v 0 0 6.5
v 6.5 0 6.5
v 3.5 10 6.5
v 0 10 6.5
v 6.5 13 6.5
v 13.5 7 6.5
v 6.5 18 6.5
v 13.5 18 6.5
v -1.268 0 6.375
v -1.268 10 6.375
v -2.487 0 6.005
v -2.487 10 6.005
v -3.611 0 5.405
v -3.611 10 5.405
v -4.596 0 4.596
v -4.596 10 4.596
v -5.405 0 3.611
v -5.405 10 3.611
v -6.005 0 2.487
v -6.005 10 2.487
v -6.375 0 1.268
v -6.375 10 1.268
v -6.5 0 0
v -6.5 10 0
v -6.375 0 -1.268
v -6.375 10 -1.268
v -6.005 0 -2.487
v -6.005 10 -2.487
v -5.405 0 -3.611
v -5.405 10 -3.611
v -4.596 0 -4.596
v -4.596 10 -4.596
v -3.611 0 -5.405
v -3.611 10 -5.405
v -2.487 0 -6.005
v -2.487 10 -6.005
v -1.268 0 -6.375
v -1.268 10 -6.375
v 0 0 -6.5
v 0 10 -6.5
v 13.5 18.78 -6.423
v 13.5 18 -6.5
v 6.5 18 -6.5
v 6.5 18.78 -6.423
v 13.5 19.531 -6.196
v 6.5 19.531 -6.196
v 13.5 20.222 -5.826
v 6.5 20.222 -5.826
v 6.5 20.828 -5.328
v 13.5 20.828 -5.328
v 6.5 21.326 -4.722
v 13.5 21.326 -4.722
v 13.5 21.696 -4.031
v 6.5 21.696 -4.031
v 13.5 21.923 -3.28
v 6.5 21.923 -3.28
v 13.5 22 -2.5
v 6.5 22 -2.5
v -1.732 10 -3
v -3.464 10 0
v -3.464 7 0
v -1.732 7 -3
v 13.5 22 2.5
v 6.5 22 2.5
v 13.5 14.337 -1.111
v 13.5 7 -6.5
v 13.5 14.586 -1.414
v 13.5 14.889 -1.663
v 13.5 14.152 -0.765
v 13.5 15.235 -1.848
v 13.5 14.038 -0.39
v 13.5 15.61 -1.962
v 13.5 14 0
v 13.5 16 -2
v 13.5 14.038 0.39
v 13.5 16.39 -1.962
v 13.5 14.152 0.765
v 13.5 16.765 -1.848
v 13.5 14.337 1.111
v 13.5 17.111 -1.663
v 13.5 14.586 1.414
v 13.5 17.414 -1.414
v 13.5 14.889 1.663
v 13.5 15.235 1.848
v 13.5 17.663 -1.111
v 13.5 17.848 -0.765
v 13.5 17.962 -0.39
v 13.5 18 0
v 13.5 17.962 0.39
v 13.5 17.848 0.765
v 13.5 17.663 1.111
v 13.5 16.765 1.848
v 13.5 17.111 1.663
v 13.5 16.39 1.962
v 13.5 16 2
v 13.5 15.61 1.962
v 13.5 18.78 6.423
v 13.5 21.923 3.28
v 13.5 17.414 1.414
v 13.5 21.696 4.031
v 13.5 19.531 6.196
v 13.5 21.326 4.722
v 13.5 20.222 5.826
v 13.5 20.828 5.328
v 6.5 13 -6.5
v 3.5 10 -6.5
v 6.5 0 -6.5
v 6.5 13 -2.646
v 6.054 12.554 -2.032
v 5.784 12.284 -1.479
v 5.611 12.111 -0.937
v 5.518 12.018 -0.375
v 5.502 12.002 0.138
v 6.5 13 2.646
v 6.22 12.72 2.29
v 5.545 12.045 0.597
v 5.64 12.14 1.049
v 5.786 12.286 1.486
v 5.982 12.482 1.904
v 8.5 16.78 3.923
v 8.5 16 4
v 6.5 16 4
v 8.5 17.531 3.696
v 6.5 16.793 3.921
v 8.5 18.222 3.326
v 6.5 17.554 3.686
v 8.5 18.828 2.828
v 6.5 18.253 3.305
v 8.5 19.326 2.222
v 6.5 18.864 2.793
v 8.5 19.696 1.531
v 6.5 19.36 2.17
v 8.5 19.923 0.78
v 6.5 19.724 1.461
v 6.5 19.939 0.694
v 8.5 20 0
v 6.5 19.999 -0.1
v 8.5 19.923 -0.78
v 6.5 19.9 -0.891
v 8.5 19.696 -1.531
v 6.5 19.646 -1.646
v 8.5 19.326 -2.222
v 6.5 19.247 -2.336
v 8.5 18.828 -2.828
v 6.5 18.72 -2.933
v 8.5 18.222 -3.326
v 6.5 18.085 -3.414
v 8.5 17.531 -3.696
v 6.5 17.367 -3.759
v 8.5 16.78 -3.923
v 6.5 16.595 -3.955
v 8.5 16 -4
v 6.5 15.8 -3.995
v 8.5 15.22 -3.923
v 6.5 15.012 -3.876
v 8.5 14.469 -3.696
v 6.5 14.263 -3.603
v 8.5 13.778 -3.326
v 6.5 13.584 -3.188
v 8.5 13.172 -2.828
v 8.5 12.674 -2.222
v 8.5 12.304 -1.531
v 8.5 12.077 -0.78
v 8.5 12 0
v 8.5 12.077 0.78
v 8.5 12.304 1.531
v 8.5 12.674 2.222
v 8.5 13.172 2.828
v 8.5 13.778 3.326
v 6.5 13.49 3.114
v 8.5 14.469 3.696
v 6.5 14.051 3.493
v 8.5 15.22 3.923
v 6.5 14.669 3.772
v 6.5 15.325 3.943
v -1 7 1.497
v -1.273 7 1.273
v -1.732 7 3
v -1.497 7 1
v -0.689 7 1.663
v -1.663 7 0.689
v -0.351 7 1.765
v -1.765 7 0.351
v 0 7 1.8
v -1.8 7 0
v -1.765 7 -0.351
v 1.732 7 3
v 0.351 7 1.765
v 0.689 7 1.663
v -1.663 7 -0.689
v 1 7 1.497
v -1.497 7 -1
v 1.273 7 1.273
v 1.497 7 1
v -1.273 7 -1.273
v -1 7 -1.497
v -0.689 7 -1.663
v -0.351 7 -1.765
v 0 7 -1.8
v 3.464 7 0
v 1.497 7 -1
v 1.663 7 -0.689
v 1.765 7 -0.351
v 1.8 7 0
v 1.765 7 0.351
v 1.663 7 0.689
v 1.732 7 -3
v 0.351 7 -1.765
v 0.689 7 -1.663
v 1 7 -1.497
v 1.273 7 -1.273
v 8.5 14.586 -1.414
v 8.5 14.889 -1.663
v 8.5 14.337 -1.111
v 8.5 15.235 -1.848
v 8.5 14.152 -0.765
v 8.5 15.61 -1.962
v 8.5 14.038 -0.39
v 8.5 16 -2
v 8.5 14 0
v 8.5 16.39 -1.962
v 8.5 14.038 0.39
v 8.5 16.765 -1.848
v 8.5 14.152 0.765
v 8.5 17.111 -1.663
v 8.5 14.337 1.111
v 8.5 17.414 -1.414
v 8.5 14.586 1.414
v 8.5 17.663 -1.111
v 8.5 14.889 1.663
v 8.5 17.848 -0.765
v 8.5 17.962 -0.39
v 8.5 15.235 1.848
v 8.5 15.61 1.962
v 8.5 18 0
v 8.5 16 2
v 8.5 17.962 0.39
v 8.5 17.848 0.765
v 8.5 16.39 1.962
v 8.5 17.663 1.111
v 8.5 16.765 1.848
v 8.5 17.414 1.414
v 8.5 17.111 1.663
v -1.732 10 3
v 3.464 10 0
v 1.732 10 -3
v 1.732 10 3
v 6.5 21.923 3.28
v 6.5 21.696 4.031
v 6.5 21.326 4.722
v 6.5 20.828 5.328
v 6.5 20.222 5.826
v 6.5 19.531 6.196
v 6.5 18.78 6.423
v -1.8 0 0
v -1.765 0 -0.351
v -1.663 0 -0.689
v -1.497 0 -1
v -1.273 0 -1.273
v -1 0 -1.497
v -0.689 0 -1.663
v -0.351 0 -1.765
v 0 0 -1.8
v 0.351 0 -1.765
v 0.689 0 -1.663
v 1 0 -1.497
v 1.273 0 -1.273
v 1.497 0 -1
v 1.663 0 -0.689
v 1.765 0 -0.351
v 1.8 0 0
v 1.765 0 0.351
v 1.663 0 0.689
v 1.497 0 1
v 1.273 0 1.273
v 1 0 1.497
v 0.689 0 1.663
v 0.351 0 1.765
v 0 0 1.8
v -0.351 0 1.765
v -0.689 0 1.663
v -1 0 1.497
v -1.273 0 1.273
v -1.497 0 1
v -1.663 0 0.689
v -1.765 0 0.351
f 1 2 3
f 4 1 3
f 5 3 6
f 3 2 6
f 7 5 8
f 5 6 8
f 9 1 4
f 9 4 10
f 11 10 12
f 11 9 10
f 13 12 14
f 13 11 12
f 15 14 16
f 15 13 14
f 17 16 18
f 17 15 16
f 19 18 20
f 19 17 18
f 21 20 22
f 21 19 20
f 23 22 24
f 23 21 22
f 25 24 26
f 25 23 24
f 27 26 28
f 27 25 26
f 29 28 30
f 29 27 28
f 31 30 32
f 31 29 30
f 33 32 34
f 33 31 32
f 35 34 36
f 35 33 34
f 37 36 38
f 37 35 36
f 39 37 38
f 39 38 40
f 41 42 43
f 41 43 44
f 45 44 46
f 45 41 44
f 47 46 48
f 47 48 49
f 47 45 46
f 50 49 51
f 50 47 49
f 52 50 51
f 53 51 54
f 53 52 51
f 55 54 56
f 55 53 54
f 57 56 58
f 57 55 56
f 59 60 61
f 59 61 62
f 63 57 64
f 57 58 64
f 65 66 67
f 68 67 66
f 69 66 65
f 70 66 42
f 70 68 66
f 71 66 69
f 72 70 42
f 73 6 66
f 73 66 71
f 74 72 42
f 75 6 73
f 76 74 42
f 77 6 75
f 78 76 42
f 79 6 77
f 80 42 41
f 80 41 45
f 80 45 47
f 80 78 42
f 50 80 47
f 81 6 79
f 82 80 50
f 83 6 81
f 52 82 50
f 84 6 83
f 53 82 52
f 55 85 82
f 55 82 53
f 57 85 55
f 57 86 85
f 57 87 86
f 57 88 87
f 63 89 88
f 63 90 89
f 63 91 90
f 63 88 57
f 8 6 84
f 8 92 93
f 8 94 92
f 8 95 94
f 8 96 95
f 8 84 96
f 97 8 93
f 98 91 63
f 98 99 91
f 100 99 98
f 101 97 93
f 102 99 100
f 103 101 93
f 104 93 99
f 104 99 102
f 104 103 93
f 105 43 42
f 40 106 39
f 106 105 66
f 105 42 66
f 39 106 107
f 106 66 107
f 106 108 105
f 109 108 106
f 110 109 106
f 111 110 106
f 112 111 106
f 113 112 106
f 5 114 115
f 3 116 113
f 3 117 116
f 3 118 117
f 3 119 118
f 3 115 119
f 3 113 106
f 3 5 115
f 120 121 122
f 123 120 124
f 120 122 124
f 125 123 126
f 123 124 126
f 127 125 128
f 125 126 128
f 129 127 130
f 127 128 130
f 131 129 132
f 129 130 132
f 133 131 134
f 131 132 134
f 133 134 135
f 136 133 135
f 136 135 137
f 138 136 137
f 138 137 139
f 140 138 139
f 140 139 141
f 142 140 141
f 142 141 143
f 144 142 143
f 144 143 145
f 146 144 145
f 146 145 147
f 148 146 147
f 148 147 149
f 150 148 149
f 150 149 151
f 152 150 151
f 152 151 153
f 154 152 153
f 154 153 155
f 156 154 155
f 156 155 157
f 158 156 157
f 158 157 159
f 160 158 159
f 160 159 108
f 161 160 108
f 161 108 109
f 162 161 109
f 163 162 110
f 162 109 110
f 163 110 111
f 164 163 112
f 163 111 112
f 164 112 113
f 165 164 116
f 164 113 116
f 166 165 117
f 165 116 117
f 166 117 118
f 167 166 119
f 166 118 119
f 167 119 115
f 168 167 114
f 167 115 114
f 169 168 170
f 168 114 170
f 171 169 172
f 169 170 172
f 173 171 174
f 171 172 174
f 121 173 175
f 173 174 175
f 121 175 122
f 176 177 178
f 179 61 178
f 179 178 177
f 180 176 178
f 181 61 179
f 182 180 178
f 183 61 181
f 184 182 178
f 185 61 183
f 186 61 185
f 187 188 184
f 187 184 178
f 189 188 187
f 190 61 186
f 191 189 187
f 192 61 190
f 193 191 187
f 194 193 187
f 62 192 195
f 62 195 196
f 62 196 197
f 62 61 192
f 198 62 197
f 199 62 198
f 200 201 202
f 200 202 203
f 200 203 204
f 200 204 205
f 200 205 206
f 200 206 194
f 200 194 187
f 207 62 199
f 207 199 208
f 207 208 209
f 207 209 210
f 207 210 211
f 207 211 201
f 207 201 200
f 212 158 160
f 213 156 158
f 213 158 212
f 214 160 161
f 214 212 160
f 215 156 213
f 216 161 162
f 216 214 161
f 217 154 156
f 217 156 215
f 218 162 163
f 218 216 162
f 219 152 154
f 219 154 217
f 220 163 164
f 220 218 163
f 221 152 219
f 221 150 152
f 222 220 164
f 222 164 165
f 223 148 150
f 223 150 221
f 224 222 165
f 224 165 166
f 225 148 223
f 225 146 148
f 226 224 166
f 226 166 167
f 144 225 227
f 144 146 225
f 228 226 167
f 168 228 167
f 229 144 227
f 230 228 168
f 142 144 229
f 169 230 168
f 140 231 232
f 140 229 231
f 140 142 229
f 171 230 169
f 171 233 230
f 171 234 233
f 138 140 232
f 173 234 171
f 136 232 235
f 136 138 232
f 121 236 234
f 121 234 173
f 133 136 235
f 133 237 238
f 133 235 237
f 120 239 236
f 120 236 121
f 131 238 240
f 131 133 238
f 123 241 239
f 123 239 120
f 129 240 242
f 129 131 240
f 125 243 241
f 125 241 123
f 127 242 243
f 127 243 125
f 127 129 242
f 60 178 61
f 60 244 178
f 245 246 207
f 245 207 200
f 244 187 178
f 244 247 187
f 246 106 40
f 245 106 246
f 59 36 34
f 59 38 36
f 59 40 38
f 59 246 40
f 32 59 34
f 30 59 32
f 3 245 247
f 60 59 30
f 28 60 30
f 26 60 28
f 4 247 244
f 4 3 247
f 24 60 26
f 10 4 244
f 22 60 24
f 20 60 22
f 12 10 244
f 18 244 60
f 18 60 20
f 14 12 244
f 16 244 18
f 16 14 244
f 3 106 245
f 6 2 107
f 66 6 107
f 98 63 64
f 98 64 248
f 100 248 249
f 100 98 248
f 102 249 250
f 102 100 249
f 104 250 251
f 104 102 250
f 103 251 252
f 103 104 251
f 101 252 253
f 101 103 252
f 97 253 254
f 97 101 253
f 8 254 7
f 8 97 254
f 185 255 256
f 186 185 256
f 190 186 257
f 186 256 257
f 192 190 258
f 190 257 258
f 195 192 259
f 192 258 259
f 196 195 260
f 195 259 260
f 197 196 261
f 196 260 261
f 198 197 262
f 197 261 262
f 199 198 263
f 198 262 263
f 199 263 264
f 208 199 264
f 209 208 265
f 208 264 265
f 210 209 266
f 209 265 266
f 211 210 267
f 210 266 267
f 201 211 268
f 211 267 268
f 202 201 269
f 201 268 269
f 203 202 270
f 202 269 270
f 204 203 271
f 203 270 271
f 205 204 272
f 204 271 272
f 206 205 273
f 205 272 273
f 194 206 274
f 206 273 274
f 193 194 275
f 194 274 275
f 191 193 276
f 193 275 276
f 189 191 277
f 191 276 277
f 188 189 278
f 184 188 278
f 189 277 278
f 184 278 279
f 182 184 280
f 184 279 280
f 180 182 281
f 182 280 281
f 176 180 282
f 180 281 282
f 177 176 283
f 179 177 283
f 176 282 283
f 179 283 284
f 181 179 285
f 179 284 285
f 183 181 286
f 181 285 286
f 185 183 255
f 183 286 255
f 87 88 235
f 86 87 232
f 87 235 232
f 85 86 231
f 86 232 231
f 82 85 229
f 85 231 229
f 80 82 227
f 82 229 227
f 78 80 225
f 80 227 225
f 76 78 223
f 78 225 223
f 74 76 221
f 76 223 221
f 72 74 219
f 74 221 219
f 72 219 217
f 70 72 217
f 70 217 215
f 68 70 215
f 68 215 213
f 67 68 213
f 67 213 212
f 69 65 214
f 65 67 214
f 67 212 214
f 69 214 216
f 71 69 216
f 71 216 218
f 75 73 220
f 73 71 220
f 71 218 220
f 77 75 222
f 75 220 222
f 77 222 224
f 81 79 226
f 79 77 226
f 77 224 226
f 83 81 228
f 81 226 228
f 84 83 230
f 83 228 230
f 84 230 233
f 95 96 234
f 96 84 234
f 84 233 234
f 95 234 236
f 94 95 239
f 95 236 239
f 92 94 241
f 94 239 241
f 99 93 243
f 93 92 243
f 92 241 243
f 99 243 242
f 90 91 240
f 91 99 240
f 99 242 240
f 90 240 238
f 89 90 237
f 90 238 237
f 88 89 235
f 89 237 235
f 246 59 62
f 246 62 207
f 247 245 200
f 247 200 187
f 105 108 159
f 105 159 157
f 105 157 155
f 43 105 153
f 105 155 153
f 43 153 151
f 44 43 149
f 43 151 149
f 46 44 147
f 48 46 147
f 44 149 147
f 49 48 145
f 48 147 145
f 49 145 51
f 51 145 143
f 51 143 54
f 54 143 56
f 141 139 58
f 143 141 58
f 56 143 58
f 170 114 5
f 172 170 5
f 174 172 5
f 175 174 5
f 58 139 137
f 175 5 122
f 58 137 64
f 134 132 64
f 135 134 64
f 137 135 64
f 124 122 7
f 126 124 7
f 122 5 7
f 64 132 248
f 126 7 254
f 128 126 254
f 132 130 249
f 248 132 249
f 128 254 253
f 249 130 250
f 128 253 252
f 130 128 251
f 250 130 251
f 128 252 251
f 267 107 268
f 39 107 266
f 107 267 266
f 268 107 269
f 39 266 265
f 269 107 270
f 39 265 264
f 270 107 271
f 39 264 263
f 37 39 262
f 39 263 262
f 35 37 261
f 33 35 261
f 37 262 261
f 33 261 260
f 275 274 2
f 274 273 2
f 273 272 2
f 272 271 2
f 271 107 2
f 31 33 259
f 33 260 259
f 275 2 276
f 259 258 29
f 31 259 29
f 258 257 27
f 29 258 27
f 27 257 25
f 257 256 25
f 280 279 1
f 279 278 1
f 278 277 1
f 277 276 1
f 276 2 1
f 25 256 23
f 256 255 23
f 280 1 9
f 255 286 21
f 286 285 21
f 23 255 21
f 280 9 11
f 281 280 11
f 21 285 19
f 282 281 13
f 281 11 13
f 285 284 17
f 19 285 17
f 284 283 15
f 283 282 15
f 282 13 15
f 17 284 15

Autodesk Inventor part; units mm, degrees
ref_plane "XZ Plane" through (0, 0, 0) normal (0, 1, 0) x (-1, 0, 0)
ref_plane "XY Plane" through (0, 0, 0) normal (0, 0, 1) x (1, 0, 0)
sketch "Sketch1" plane through (0, 0, 0) normal (0, 1, 0) x (-1, 0, 0)
  circle A0 centre (0, 0) radius 6.5
  circle A1 centre (0, 0) radius 1.8
  dimension "d0" = 13
  dimension "d1" = 3.6
extrude "Extrusion1" add sketch "Sketch1" along normal blind 10
sketch "Sketch2" plane through (0, 10, 0) normal (0, 1, 0) x (1, 0, 0)
  point P0 (0, 0)
ref_plane "Work Plane1" through (6.5, 0, 0) normal (1, 0, 0) x (0, 1, 0)
sketch "Sketch3" plane through (6.5, 0, 0) normal (1, 0, 0) x (0, 1, 0)
  line L0 (10, -6.5) -> (10, 6.5) projected
  line L1 (10, -6.5) -> (22, -6.5)
  line L2 (22, -6.5) -> (22, 6.5)
  line L3 (22, 6.5) -> (10, 6.5)
  line L4 (10, 6.5) -> (10, -6.5)
  line L5 (0, -6.5) -> (0, 6.5) projected
  line L6 (10, -6.5) -> (0, -6.5)
  line L7 (0, -6.5) -> (0, 6.5)
  line L8 (0, 6.5) -> (10, 6.5)
  line L9 (10, 6.5) -> (10, -6.5)
  circle A0 centre (16, 0) radius 2
  point P0 (0, 0)
  point P1 (0, -6.5)
  point P2 (10, 6.5)
  point P3 (10, 6.5)
  dimension "d5" = 12
  dimension "d6" = 4
  dimension "d11" = 6
extrude "Extrusion2" add sketch "Sketch3" against normal up to surface contours L6 L5 L8 L0
extrude "Extrusion3" add sketch "Sketch3" along normal blind 7
sketch "Sketch5" plane through (0, 10, 0) normal (0, 1, 0) x (1, 0, 0)
  line L0 (3.4641, 0) -> (1.7321, -3)
  line L1 (1.7321, -3) -> (-1.7321, -3)
  line L2 (-1.7321, -3) -> (-3.4641, 0)
  line L3 (-3.4641, 0) -> (-1.7321, 3)
  line L4 (-1.7321, 3) -> (1.7321, 3)
  line L5 (1.7321, 3) -> (3.4641, 0)
  point P0 (0, 0)
  point P1 (0, 0)
  dimension "d12" = 6
extrude "Extrusion4" cut sketch "Sketch5" against normal blind 3
fillet "Fillet1" radius 4 2 edges at (10, 22, 6.5) (10, 22, -6.5)
sketch "Sketch6" plane through (6.5, 0, 0) normal (-1, 0, 0) x (0, 0, 1)
  circle A0 centre (0, 16) radius 2 projected
  circle A1 centre (0, 16) radius 4
  point P0 (0, 0)
  dimension "d16" = 8
extrude "Extrusion5" cut sketch "Sketch6" against normal blind 2
chamfer "Chamfer1" distance 7 angle 45 1 edges at (13.5, 0, 0)
chamfer "Chamfer2" distance 3 angle 45 1 edges at (6.5, 10, 0)
properties part number "SpringConn"
